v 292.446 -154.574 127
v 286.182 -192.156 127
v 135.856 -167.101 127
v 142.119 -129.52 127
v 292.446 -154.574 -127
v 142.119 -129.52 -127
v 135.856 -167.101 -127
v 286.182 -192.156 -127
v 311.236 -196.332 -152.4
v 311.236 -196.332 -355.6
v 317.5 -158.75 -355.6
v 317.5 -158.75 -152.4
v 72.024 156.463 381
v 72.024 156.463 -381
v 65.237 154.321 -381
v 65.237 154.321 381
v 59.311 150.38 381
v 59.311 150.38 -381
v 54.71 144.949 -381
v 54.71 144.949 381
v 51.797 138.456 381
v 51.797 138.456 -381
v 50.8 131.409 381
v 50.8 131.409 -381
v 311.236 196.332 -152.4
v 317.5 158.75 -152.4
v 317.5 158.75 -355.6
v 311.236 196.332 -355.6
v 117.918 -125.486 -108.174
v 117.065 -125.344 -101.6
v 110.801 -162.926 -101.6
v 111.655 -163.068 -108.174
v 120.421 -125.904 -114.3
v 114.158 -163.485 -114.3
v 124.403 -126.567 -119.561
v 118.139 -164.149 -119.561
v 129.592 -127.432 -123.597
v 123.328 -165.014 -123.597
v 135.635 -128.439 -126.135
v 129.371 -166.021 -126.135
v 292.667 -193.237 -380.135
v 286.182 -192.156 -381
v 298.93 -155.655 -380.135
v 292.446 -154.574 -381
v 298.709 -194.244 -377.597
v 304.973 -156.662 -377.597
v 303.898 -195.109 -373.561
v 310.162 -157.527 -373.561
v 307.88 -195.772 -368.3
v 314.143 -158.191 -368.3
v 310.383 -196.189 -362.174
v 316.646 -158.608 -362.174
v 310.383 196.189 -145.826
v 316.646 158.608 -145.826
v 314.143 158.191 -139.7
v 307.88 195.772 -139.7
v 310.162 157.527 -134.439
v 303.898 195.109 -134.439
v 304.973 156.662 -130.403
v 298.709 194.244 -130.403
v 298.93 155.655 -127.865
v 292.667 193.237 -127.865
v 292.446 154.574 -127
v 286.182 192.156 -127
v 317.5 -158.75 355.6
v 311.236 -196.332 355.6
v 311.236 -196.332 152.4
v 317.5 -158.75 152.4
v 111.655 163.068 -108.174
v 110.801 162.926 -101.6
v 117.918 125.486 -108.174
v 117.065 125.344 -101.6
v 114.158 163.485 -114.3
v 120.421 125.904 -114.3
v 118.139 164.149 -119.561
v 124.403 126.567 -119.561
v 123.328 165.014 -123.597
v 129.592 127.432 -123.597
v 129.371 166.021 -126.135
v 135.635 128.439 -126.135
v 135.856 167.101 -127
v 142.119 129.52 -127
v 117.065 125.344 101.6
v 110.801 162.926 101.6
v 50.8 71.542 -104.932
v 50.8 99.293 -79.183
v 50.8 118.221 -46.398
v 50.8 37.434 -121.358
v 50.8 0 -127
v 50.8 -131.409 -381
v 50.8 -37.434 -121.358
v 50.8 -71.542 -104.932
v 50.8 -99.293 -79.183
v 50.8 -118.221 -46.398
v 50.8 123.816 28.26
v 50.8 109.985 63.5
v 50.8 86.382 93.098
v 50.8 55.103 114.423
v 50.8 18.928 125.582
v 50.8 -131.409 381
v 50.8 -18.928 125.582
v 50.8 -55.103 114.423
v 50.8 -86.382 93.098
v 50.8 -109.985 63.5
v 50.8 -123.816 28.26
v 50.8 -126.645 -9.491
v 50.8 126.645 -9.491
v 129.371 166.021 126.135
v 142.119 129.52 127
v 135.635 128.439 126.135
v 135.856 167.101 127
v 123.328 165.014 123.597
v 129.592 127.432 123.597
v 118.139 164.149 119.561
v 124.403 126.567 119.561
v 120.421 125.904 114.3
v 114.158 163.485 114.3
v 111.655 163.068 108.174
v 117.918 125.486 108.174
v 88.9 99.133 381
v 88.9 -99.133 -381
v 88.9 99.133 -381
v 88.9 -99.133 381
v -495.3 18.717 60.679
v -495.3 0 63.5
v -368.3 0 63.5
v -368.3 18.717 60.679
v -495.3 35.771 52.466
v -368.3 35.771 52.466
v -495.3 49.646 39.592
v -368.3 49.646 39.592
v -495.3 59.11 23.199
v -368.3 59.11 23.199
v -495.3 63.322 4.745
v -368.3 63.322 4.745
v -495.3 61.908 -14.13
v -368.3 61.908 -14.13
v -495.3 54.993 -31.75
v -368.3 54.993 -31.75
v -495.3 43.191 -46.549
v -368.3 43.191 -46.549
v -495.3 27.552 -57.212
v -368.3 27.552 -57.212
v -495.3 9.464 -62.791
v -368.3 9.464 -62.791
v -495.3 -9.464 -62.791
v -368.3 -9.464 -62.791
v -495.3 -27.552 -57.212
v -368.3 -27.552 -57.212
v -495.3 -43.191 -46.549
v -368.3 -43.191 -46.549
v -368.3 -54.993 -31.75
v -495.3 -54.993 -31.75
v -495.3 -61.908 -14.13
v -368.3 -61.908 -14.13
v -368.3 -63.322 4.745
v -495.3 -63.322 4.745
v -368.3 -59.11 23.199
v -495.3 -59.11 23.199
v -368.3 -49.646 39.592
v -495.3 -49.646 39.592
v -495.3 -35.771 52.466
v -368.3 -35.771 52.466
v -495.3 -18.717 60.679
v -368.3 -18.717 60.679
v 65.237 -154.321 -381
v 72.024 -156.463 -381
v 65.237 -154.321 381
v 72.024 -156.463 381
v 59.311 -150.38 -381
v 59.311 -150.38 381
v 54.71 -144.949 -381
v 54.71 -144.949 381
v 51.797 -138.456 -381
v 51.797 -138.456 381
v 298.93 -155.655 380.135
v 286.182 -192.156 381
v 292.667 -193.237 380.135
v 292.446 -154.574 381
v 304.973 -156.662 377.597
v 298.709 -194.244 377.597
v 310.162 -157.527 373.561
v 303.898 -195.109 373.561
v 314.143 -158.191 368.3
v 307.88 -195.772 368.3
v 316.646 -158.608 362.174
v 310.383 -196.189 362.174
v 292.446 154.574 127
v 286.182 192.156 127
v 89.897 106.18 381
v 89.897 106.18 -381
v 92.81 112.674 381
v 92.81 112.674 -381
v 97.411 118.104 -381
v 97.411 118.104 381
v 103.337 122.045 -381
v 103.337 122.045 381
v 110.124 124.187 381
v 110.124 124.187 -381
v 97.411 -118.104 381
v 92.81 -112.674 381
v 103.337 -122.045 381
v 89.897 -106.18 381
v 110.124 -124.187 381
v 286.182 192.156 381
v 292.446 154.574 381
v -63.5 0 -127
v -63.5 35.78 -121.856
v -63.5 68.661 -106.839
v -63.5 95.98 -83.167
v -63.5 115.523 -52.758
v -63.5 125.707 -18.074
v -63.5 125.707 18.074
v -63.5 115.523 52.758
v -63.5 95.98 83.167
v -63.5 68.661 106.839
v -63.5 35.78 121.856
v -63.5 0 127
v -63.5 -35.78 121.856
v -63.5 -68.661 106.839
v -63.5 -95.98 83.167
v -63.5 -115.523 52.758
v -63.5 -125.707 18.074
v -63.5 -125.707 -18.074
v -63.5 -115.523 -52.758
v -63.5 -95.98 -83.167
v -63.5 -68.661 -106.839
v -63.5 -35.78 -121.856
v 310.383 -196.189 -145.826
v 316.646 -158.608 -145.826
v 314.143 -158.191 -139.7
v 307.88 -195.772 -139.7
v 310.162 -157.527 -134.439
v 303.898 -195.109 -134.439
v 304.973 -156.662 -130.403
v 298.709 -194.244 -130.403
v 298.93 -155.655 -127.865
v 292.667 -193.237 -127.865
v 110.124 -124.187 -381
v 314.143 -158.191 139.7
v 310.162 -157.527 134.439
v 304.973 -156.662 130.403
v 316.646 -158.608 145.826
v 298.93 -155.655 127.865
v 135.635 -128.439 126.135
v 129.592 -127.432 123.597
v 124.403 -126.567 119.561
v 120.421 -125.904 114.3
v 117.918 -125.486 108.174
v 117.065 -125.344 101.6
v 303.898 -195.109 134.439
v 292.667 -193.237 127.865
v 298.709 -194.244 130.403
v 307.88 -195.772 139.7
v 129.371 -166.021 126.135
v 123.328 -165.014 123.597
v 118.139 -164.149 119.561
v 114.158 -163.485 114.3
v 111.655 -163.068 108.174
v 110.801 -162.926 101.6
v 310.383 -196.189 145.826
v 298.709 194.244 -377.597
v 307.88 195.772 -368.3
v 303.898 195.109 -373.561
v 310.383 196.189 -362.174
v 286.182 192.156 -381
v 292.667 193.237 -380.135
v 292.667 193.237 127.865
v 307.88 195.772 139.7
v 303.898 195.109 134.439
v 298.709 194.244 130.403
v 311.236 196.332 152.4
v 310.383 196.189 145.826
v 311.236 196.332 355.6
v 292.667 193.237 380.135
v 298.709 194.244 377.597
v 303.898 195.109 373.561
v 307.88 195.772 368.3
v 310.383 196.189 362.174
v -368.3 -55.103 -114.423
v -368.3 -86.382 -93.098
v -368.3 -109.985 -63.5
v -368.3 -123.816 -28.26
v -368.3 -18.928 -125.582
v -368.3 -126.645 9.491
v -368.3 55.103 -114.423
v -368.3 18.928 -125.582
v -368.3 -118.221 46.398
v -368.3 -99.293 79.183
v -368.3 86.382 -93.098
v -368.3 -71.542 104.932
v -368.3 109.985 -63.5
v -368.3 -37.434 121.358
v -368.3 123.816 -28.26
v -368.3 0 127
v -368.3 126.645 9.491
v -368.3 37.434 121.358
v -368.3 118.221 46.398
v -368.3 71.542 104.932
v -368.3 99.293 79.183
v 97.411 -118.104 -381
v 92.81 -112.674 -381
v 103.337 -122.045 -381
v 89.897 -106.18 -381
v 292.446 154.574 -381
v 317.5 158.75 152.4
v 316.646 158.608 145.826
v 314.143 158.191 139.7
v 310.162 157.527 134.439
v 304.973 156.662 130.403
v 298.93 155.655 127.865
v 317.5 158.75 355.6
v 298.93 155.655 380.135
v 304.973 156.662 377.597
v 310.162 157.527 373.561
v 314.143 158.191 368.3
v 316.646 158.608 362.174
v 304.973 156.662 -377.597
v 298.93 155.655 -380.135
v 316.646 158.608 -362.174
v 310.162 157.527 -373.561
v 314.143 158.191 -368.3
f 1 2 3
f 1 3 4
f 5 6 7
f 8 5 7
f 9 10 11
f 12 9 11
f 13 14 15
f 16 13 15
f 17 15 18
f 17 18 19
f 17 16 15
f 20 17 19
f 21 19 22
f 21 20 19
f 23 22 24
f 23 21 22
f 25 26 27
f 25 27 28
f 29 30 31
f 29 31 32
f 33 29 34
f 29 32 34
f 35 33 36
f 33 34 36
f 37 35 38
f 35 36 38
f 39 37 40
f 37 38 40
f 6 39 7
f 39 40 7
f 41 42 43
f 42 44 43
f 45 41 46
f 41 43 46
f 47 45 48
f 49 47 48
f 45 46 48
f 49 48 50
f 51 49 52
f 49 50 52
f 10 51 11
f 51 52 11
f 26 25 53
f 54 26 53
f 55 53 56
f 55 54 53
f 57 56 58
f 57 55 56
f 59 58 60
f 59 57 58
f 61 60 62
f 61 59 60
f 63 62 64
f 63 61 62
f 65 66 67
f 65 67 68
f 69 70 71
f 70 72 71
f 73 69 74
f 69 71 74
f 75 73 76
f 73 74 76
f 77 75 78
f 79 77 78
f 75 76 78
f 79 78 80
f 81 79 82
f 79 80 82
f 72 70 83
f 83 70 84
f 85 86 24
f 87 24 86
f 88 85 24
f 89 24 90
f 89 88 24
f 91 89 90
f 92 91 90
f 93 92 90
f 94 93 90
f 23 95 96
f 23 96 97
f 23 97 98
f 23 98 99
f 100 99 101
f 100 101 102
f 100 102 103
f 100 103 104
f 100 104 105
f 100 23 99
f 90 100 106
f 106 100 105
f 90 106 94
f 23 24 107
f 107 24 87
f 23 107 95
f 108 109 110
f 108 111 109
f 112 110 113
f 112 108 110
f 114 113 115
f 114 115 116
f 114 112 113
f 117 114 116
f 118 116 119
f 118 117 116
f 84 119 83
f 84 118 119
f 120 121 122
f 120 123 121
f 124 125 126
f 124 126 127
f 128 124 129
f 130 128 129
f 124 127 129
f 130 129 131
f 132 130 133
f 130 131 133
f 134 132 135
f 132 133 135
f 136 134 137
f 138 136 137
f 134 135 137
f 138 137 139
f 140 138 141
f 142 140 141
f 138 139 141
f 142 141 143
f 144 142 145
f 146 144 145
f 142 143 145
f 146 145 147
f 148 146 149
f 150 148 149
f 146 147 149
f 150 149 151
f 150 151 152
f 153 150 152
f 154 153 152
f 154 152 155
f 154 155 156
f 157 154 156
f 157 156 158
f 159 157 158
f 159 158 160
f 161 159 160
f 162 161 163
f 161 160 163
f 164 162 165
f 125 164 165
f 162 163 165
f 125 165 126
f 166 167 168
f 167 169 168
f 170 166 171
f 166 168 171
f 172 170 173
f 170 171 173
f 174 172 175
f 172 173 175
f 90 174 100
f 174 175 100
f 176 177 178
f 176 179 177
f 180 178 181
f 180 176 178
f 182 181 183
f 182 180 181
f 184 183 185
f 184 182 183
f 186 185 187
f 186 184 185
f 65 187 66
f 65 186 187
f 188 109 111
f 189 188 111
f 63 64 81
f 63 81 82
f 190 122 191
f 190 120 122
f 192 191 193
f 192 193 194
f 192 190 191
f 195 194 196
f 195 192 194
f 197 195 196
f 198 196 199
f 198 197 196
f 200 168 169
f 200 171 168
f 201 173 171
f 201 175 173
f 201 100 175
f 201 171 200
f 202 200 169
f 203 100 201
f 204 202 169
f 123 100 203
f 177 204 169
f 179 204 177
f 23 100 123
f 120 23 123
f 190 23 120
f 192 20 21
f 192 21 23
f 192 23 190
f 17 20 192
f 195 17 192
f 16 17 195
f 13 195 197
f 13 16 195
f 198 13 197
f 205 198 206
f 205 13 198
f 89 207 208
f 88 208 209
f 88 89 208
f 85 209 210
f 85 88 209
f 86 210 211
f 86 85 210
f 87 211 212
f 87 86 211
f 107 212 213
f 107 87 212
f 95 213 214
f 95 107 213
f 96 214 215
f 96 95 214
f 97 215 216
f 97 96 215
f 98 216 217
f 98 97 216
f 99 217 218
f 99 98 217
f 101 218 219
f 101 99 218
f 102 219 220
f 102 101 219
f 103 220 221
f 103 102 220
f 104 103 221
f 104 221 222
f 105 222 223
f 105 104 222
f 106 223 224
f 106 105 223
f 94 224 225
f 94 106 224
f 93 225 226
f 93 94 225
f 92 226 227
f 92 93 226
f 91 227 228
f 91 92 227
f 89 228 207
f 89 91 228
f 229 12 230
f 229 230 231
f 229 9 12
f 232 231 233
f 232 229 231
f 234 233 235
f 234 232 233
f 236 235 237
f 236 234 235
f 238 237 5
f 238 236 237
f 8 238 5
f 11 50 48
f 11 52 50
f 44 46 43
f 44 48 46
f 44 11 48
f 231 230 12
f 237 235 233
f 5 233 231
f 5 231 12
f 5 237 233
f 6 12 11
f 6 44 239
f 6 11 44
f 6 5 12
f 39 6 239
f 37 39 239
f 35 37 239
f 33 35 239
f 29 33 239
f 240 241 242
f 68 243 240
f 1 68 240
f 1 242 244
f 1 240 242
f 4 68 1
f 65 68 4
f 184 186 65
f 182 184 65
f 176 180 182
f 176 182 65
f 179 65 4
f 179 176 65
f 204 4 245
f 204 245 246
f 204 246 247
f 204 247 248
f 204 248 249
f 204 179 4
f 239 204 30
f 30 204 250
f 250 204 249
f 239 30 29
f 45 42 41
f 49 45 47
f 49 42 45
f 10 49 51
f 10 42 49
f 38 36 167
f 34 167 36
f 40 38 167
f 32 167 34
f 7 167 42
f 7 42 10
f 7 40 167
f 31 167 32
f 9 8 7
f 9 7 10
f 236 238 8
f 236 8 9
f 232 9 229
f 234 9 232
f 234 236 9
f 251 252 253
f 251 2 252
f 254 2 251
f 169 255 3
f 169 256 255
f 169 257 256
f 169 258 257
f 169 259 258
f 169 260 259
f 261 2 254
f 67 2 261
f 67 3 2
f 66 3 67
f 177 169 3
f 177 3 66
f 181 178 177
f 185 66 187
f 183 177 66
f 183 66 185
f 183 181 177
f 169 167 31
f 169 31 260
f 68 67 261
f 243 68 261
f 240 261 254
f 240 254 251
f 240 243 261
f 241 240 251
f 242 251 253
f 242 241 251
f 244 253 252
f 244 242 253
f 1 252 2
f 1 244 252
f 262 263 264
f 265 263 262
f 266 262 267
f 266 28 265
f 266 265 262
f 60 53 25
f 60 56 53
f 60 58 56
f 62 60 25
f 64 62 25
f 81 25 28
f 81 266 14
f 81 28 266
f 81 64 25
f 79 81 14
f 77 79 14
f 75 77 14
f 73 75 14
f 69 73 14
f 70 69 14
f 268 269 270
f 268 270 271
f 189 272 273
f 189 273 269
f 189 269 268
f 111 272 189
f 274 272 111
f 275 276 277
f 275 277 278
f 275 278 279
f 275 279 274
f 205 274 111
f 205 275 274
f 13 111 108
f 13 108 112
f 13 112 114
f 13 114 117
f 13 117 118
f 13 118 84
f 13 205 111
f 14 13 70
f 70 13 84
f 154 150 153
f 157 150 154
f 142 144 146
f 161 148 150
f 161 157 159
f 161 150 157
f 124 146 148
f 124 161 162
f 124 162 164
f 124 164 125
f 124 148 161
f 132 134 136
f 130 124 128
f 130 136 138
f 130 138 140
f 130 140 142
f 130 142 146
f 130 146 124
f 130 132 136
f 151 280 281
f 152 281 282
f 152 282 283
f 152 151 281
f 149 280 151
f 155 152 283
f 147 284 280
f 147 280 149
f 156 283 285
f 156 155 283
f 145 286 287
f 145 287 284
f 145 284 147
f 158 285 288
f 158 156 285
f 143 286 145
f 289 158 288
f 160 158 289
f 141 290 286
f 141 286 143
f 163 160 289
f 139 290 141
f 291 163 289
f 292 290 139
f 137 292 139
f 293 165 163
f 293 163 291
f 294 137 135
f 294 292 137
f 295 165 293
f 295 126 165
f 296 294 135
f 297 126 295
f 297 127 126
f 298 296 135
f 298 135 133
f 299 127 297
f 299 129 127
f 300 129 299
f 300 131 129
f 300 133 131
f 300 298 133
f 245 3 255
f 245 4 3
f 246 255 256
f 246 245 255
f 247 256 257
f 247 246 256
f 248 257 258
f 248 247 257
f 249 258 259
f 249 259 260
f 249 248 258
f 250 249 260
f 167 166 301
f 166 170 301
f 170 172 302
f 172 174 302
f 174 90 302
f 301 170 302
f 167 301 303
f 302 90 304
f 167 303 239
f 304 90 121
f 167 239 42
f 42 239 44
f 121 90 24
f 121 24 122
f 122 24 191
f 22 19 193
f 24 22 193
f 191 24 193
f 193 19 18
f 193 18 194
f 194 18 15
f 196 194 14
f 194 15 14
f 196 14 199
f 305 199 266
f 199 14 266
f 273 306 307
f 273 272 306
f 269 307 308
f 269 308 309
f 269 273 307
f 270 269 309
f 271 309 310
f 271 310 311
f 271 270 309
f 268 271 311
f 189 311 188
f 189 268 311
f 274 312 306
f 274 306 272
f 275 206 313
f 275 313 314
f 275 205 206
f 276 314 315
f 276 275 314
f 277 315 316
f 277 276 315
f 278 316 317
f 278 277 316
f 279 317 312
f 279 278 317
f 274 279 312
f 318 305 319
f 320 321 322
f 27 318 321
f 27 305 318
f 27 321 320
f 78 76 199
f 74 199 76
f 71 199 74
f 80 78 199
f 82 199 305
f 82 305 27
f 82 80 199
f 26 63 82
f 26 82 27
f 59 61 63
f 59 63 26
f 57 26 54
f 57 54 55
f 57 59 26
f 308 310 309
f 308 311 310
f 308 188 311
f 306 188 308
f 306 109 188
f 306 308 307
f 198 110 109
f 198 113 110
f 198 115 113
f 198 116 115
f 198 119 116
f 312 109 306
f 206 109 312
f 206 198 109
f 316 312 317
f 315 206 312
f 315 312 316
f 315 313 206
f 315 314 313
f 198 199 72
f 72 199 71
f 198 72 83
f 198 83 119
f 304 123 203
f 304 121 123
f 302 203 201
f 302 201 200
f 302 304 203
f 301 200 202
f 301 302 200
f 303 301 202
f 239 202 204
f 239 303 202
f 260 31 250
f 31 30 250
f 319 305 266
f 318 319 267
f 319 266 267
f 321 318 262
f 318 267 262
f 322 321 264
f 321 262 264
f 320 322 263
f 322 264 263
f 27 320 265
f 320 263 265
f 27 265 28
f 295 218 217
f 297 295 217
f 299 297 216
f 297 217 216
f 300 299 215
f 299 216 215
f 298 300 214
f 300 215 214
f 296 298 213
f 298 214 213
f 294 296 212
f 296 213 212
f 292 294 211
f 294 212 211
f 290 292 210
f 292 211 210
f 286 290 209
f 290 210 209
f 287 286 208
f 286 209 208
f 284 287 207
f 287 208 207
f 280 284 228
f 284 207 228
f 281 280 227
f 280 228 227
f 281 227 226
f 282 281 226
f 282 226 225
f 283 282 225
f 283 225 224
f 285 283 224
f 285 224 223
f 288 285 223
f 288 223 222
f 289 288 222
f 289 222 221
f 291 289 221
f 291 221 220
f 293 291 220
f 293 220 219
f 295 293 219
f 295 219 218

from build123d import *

# Parameters (mm, degrees)
SKETCH1_R           = 127
BOSS_EXTRUDE1_DEPTH = 63.5
BOSS_EXTRUDE2_DEPTH = 381
CUT_EXTRUDE1_DEPTH  = 203.2
CUT_EXTRUDE2_DEPTH  = 203.2
FILLET1_R           = 25.4
FILLET2_R           = 25.4
FILLET3_R           = 25.4
SKETCH5_R           = 127
BOSS_EXTRUDE3_DEPTH = 304.8
SKETCH6_R           = 63.5
BOSS_EXTRUDE4_DEPTH = 127


with BuildPart() as part:
    # Sketch1 → Boss-Extrude1 (new body, symmetric)
    with BuildSketch(Plane(origin=(0, 0, 0), x_dir=(0, 0, -1), z_dir=(1, 0, 0))):
        Circle(SKETCH1_R)
    extrude(amount=BOSS_EXTRUDE1_DEPTH, both=True)

    # Sketch2 → Boss-Extrude2 (add, symmetric)
    with BuildSketch(Plane.XY):
        Polygon((88.9, -120.65), (88.9, 120.65), (317.5, 158.75), (311.236398584, 196.331608498), (50.8, 152.925542067), (50.8, -152.925542067), (311.236398584, -196.331608498), (317.5, -158.75), align=None)
    extrude(amount=BOSS_EXTRUDE2_DEPTH, both=True)

    # Sketch3 → Cut-Extrude1 (cut)
    with BuildSketch(Plane(origin=(334.662162162, 55.777027027, 0), x_dir=(0, 0, -1), z_dir=(0.986393924, 0.164398987, 0))):
        Polygon((0, 104.393356939), (-127, 104.393356939), (-127, 142.493356939), (127, 142.493356939), (127, 104.393356939), align=None)
    extrude(amount=-CUT_EXTRUDE1_DEPTH, mode=Mode.SUBTRACT)

    # Sketch4 → Cut-Extrude2 (cut)
    with BuildSketch(Plane(origin=(334.662162162, -55.777027027, 0), x_dir=(0, 0, -1), z_dir=(0.986393924, -0.164398987, 0))):
        Polygon((0, -142.493356939), (-127, -142.493356939), (-127, -104.393356939), (127, -104.393356939), (127, -142.493356939), align=None)
    extrude(amount=-CUT_EXTRUDE2_DEPTH, mode=Mode.SUBTRACT)

    # Fillet1
    fillet1_edges = [part.edges().sort_by_distance(p)[0] for p in [
        (88.9, -120.65, 0),
        (88.9, 120.65, 0),
    ]]
    fillet(fillet1_edges, radius=FILLET1_R)

    # Fillet2
    fillet2_edges = [part.edges().sort_by_distance(p)[0] for p in [
        (50.8, 152.925542067, 0),
        (50.8, -152.925542067, 0),
    ]]
    fillet(fillet2_edges, radius=FILLET2_R)

    # Fillet3
    fillet3_edges = [part.edges().sort_by_distance(p)[0] for p in [
        (314.368199292, -177.540804249, 381),
        (113.932953969, 144.134930029, 127),
        (113.932953969, 144.134930029, -127),
        (314.368199292, 177.540804249, -127),
        (314.368199292, 177.540804249, 127),
        (113.932953969, -144.134930029, 127),
        (113.932953969, -144.134930029, -127),
        (314.368199292, -177.540804249, -127),
        (314.368199292, -177.540804249, 127),
        (314.368199292, 177.540804249, -381),
        (314.368199292, -177.540804249, -381),
        (314.368199292, 177.540804249, 381),
    ]]
    fillet(fillet3_edges, radius=FILLET3_R)

    # Sketch5 → Boss-Extrude3 (add)
    with BuildSketch(Plane.ZY.offset(63.5)):
        Circle(SKETCH5_R)
    extrude(amount=BOSS_EXTRUDE3_DEPTH)

    # Sketch6 → Boss-Extrude4 (add)
    with BuildSketch(Plane.ZY.offset(368.3)):
        Circle(SKETCH6_R)
    extrude(amount=BOSS_EXTRUDE4_DEPTH)


solid = part.part
